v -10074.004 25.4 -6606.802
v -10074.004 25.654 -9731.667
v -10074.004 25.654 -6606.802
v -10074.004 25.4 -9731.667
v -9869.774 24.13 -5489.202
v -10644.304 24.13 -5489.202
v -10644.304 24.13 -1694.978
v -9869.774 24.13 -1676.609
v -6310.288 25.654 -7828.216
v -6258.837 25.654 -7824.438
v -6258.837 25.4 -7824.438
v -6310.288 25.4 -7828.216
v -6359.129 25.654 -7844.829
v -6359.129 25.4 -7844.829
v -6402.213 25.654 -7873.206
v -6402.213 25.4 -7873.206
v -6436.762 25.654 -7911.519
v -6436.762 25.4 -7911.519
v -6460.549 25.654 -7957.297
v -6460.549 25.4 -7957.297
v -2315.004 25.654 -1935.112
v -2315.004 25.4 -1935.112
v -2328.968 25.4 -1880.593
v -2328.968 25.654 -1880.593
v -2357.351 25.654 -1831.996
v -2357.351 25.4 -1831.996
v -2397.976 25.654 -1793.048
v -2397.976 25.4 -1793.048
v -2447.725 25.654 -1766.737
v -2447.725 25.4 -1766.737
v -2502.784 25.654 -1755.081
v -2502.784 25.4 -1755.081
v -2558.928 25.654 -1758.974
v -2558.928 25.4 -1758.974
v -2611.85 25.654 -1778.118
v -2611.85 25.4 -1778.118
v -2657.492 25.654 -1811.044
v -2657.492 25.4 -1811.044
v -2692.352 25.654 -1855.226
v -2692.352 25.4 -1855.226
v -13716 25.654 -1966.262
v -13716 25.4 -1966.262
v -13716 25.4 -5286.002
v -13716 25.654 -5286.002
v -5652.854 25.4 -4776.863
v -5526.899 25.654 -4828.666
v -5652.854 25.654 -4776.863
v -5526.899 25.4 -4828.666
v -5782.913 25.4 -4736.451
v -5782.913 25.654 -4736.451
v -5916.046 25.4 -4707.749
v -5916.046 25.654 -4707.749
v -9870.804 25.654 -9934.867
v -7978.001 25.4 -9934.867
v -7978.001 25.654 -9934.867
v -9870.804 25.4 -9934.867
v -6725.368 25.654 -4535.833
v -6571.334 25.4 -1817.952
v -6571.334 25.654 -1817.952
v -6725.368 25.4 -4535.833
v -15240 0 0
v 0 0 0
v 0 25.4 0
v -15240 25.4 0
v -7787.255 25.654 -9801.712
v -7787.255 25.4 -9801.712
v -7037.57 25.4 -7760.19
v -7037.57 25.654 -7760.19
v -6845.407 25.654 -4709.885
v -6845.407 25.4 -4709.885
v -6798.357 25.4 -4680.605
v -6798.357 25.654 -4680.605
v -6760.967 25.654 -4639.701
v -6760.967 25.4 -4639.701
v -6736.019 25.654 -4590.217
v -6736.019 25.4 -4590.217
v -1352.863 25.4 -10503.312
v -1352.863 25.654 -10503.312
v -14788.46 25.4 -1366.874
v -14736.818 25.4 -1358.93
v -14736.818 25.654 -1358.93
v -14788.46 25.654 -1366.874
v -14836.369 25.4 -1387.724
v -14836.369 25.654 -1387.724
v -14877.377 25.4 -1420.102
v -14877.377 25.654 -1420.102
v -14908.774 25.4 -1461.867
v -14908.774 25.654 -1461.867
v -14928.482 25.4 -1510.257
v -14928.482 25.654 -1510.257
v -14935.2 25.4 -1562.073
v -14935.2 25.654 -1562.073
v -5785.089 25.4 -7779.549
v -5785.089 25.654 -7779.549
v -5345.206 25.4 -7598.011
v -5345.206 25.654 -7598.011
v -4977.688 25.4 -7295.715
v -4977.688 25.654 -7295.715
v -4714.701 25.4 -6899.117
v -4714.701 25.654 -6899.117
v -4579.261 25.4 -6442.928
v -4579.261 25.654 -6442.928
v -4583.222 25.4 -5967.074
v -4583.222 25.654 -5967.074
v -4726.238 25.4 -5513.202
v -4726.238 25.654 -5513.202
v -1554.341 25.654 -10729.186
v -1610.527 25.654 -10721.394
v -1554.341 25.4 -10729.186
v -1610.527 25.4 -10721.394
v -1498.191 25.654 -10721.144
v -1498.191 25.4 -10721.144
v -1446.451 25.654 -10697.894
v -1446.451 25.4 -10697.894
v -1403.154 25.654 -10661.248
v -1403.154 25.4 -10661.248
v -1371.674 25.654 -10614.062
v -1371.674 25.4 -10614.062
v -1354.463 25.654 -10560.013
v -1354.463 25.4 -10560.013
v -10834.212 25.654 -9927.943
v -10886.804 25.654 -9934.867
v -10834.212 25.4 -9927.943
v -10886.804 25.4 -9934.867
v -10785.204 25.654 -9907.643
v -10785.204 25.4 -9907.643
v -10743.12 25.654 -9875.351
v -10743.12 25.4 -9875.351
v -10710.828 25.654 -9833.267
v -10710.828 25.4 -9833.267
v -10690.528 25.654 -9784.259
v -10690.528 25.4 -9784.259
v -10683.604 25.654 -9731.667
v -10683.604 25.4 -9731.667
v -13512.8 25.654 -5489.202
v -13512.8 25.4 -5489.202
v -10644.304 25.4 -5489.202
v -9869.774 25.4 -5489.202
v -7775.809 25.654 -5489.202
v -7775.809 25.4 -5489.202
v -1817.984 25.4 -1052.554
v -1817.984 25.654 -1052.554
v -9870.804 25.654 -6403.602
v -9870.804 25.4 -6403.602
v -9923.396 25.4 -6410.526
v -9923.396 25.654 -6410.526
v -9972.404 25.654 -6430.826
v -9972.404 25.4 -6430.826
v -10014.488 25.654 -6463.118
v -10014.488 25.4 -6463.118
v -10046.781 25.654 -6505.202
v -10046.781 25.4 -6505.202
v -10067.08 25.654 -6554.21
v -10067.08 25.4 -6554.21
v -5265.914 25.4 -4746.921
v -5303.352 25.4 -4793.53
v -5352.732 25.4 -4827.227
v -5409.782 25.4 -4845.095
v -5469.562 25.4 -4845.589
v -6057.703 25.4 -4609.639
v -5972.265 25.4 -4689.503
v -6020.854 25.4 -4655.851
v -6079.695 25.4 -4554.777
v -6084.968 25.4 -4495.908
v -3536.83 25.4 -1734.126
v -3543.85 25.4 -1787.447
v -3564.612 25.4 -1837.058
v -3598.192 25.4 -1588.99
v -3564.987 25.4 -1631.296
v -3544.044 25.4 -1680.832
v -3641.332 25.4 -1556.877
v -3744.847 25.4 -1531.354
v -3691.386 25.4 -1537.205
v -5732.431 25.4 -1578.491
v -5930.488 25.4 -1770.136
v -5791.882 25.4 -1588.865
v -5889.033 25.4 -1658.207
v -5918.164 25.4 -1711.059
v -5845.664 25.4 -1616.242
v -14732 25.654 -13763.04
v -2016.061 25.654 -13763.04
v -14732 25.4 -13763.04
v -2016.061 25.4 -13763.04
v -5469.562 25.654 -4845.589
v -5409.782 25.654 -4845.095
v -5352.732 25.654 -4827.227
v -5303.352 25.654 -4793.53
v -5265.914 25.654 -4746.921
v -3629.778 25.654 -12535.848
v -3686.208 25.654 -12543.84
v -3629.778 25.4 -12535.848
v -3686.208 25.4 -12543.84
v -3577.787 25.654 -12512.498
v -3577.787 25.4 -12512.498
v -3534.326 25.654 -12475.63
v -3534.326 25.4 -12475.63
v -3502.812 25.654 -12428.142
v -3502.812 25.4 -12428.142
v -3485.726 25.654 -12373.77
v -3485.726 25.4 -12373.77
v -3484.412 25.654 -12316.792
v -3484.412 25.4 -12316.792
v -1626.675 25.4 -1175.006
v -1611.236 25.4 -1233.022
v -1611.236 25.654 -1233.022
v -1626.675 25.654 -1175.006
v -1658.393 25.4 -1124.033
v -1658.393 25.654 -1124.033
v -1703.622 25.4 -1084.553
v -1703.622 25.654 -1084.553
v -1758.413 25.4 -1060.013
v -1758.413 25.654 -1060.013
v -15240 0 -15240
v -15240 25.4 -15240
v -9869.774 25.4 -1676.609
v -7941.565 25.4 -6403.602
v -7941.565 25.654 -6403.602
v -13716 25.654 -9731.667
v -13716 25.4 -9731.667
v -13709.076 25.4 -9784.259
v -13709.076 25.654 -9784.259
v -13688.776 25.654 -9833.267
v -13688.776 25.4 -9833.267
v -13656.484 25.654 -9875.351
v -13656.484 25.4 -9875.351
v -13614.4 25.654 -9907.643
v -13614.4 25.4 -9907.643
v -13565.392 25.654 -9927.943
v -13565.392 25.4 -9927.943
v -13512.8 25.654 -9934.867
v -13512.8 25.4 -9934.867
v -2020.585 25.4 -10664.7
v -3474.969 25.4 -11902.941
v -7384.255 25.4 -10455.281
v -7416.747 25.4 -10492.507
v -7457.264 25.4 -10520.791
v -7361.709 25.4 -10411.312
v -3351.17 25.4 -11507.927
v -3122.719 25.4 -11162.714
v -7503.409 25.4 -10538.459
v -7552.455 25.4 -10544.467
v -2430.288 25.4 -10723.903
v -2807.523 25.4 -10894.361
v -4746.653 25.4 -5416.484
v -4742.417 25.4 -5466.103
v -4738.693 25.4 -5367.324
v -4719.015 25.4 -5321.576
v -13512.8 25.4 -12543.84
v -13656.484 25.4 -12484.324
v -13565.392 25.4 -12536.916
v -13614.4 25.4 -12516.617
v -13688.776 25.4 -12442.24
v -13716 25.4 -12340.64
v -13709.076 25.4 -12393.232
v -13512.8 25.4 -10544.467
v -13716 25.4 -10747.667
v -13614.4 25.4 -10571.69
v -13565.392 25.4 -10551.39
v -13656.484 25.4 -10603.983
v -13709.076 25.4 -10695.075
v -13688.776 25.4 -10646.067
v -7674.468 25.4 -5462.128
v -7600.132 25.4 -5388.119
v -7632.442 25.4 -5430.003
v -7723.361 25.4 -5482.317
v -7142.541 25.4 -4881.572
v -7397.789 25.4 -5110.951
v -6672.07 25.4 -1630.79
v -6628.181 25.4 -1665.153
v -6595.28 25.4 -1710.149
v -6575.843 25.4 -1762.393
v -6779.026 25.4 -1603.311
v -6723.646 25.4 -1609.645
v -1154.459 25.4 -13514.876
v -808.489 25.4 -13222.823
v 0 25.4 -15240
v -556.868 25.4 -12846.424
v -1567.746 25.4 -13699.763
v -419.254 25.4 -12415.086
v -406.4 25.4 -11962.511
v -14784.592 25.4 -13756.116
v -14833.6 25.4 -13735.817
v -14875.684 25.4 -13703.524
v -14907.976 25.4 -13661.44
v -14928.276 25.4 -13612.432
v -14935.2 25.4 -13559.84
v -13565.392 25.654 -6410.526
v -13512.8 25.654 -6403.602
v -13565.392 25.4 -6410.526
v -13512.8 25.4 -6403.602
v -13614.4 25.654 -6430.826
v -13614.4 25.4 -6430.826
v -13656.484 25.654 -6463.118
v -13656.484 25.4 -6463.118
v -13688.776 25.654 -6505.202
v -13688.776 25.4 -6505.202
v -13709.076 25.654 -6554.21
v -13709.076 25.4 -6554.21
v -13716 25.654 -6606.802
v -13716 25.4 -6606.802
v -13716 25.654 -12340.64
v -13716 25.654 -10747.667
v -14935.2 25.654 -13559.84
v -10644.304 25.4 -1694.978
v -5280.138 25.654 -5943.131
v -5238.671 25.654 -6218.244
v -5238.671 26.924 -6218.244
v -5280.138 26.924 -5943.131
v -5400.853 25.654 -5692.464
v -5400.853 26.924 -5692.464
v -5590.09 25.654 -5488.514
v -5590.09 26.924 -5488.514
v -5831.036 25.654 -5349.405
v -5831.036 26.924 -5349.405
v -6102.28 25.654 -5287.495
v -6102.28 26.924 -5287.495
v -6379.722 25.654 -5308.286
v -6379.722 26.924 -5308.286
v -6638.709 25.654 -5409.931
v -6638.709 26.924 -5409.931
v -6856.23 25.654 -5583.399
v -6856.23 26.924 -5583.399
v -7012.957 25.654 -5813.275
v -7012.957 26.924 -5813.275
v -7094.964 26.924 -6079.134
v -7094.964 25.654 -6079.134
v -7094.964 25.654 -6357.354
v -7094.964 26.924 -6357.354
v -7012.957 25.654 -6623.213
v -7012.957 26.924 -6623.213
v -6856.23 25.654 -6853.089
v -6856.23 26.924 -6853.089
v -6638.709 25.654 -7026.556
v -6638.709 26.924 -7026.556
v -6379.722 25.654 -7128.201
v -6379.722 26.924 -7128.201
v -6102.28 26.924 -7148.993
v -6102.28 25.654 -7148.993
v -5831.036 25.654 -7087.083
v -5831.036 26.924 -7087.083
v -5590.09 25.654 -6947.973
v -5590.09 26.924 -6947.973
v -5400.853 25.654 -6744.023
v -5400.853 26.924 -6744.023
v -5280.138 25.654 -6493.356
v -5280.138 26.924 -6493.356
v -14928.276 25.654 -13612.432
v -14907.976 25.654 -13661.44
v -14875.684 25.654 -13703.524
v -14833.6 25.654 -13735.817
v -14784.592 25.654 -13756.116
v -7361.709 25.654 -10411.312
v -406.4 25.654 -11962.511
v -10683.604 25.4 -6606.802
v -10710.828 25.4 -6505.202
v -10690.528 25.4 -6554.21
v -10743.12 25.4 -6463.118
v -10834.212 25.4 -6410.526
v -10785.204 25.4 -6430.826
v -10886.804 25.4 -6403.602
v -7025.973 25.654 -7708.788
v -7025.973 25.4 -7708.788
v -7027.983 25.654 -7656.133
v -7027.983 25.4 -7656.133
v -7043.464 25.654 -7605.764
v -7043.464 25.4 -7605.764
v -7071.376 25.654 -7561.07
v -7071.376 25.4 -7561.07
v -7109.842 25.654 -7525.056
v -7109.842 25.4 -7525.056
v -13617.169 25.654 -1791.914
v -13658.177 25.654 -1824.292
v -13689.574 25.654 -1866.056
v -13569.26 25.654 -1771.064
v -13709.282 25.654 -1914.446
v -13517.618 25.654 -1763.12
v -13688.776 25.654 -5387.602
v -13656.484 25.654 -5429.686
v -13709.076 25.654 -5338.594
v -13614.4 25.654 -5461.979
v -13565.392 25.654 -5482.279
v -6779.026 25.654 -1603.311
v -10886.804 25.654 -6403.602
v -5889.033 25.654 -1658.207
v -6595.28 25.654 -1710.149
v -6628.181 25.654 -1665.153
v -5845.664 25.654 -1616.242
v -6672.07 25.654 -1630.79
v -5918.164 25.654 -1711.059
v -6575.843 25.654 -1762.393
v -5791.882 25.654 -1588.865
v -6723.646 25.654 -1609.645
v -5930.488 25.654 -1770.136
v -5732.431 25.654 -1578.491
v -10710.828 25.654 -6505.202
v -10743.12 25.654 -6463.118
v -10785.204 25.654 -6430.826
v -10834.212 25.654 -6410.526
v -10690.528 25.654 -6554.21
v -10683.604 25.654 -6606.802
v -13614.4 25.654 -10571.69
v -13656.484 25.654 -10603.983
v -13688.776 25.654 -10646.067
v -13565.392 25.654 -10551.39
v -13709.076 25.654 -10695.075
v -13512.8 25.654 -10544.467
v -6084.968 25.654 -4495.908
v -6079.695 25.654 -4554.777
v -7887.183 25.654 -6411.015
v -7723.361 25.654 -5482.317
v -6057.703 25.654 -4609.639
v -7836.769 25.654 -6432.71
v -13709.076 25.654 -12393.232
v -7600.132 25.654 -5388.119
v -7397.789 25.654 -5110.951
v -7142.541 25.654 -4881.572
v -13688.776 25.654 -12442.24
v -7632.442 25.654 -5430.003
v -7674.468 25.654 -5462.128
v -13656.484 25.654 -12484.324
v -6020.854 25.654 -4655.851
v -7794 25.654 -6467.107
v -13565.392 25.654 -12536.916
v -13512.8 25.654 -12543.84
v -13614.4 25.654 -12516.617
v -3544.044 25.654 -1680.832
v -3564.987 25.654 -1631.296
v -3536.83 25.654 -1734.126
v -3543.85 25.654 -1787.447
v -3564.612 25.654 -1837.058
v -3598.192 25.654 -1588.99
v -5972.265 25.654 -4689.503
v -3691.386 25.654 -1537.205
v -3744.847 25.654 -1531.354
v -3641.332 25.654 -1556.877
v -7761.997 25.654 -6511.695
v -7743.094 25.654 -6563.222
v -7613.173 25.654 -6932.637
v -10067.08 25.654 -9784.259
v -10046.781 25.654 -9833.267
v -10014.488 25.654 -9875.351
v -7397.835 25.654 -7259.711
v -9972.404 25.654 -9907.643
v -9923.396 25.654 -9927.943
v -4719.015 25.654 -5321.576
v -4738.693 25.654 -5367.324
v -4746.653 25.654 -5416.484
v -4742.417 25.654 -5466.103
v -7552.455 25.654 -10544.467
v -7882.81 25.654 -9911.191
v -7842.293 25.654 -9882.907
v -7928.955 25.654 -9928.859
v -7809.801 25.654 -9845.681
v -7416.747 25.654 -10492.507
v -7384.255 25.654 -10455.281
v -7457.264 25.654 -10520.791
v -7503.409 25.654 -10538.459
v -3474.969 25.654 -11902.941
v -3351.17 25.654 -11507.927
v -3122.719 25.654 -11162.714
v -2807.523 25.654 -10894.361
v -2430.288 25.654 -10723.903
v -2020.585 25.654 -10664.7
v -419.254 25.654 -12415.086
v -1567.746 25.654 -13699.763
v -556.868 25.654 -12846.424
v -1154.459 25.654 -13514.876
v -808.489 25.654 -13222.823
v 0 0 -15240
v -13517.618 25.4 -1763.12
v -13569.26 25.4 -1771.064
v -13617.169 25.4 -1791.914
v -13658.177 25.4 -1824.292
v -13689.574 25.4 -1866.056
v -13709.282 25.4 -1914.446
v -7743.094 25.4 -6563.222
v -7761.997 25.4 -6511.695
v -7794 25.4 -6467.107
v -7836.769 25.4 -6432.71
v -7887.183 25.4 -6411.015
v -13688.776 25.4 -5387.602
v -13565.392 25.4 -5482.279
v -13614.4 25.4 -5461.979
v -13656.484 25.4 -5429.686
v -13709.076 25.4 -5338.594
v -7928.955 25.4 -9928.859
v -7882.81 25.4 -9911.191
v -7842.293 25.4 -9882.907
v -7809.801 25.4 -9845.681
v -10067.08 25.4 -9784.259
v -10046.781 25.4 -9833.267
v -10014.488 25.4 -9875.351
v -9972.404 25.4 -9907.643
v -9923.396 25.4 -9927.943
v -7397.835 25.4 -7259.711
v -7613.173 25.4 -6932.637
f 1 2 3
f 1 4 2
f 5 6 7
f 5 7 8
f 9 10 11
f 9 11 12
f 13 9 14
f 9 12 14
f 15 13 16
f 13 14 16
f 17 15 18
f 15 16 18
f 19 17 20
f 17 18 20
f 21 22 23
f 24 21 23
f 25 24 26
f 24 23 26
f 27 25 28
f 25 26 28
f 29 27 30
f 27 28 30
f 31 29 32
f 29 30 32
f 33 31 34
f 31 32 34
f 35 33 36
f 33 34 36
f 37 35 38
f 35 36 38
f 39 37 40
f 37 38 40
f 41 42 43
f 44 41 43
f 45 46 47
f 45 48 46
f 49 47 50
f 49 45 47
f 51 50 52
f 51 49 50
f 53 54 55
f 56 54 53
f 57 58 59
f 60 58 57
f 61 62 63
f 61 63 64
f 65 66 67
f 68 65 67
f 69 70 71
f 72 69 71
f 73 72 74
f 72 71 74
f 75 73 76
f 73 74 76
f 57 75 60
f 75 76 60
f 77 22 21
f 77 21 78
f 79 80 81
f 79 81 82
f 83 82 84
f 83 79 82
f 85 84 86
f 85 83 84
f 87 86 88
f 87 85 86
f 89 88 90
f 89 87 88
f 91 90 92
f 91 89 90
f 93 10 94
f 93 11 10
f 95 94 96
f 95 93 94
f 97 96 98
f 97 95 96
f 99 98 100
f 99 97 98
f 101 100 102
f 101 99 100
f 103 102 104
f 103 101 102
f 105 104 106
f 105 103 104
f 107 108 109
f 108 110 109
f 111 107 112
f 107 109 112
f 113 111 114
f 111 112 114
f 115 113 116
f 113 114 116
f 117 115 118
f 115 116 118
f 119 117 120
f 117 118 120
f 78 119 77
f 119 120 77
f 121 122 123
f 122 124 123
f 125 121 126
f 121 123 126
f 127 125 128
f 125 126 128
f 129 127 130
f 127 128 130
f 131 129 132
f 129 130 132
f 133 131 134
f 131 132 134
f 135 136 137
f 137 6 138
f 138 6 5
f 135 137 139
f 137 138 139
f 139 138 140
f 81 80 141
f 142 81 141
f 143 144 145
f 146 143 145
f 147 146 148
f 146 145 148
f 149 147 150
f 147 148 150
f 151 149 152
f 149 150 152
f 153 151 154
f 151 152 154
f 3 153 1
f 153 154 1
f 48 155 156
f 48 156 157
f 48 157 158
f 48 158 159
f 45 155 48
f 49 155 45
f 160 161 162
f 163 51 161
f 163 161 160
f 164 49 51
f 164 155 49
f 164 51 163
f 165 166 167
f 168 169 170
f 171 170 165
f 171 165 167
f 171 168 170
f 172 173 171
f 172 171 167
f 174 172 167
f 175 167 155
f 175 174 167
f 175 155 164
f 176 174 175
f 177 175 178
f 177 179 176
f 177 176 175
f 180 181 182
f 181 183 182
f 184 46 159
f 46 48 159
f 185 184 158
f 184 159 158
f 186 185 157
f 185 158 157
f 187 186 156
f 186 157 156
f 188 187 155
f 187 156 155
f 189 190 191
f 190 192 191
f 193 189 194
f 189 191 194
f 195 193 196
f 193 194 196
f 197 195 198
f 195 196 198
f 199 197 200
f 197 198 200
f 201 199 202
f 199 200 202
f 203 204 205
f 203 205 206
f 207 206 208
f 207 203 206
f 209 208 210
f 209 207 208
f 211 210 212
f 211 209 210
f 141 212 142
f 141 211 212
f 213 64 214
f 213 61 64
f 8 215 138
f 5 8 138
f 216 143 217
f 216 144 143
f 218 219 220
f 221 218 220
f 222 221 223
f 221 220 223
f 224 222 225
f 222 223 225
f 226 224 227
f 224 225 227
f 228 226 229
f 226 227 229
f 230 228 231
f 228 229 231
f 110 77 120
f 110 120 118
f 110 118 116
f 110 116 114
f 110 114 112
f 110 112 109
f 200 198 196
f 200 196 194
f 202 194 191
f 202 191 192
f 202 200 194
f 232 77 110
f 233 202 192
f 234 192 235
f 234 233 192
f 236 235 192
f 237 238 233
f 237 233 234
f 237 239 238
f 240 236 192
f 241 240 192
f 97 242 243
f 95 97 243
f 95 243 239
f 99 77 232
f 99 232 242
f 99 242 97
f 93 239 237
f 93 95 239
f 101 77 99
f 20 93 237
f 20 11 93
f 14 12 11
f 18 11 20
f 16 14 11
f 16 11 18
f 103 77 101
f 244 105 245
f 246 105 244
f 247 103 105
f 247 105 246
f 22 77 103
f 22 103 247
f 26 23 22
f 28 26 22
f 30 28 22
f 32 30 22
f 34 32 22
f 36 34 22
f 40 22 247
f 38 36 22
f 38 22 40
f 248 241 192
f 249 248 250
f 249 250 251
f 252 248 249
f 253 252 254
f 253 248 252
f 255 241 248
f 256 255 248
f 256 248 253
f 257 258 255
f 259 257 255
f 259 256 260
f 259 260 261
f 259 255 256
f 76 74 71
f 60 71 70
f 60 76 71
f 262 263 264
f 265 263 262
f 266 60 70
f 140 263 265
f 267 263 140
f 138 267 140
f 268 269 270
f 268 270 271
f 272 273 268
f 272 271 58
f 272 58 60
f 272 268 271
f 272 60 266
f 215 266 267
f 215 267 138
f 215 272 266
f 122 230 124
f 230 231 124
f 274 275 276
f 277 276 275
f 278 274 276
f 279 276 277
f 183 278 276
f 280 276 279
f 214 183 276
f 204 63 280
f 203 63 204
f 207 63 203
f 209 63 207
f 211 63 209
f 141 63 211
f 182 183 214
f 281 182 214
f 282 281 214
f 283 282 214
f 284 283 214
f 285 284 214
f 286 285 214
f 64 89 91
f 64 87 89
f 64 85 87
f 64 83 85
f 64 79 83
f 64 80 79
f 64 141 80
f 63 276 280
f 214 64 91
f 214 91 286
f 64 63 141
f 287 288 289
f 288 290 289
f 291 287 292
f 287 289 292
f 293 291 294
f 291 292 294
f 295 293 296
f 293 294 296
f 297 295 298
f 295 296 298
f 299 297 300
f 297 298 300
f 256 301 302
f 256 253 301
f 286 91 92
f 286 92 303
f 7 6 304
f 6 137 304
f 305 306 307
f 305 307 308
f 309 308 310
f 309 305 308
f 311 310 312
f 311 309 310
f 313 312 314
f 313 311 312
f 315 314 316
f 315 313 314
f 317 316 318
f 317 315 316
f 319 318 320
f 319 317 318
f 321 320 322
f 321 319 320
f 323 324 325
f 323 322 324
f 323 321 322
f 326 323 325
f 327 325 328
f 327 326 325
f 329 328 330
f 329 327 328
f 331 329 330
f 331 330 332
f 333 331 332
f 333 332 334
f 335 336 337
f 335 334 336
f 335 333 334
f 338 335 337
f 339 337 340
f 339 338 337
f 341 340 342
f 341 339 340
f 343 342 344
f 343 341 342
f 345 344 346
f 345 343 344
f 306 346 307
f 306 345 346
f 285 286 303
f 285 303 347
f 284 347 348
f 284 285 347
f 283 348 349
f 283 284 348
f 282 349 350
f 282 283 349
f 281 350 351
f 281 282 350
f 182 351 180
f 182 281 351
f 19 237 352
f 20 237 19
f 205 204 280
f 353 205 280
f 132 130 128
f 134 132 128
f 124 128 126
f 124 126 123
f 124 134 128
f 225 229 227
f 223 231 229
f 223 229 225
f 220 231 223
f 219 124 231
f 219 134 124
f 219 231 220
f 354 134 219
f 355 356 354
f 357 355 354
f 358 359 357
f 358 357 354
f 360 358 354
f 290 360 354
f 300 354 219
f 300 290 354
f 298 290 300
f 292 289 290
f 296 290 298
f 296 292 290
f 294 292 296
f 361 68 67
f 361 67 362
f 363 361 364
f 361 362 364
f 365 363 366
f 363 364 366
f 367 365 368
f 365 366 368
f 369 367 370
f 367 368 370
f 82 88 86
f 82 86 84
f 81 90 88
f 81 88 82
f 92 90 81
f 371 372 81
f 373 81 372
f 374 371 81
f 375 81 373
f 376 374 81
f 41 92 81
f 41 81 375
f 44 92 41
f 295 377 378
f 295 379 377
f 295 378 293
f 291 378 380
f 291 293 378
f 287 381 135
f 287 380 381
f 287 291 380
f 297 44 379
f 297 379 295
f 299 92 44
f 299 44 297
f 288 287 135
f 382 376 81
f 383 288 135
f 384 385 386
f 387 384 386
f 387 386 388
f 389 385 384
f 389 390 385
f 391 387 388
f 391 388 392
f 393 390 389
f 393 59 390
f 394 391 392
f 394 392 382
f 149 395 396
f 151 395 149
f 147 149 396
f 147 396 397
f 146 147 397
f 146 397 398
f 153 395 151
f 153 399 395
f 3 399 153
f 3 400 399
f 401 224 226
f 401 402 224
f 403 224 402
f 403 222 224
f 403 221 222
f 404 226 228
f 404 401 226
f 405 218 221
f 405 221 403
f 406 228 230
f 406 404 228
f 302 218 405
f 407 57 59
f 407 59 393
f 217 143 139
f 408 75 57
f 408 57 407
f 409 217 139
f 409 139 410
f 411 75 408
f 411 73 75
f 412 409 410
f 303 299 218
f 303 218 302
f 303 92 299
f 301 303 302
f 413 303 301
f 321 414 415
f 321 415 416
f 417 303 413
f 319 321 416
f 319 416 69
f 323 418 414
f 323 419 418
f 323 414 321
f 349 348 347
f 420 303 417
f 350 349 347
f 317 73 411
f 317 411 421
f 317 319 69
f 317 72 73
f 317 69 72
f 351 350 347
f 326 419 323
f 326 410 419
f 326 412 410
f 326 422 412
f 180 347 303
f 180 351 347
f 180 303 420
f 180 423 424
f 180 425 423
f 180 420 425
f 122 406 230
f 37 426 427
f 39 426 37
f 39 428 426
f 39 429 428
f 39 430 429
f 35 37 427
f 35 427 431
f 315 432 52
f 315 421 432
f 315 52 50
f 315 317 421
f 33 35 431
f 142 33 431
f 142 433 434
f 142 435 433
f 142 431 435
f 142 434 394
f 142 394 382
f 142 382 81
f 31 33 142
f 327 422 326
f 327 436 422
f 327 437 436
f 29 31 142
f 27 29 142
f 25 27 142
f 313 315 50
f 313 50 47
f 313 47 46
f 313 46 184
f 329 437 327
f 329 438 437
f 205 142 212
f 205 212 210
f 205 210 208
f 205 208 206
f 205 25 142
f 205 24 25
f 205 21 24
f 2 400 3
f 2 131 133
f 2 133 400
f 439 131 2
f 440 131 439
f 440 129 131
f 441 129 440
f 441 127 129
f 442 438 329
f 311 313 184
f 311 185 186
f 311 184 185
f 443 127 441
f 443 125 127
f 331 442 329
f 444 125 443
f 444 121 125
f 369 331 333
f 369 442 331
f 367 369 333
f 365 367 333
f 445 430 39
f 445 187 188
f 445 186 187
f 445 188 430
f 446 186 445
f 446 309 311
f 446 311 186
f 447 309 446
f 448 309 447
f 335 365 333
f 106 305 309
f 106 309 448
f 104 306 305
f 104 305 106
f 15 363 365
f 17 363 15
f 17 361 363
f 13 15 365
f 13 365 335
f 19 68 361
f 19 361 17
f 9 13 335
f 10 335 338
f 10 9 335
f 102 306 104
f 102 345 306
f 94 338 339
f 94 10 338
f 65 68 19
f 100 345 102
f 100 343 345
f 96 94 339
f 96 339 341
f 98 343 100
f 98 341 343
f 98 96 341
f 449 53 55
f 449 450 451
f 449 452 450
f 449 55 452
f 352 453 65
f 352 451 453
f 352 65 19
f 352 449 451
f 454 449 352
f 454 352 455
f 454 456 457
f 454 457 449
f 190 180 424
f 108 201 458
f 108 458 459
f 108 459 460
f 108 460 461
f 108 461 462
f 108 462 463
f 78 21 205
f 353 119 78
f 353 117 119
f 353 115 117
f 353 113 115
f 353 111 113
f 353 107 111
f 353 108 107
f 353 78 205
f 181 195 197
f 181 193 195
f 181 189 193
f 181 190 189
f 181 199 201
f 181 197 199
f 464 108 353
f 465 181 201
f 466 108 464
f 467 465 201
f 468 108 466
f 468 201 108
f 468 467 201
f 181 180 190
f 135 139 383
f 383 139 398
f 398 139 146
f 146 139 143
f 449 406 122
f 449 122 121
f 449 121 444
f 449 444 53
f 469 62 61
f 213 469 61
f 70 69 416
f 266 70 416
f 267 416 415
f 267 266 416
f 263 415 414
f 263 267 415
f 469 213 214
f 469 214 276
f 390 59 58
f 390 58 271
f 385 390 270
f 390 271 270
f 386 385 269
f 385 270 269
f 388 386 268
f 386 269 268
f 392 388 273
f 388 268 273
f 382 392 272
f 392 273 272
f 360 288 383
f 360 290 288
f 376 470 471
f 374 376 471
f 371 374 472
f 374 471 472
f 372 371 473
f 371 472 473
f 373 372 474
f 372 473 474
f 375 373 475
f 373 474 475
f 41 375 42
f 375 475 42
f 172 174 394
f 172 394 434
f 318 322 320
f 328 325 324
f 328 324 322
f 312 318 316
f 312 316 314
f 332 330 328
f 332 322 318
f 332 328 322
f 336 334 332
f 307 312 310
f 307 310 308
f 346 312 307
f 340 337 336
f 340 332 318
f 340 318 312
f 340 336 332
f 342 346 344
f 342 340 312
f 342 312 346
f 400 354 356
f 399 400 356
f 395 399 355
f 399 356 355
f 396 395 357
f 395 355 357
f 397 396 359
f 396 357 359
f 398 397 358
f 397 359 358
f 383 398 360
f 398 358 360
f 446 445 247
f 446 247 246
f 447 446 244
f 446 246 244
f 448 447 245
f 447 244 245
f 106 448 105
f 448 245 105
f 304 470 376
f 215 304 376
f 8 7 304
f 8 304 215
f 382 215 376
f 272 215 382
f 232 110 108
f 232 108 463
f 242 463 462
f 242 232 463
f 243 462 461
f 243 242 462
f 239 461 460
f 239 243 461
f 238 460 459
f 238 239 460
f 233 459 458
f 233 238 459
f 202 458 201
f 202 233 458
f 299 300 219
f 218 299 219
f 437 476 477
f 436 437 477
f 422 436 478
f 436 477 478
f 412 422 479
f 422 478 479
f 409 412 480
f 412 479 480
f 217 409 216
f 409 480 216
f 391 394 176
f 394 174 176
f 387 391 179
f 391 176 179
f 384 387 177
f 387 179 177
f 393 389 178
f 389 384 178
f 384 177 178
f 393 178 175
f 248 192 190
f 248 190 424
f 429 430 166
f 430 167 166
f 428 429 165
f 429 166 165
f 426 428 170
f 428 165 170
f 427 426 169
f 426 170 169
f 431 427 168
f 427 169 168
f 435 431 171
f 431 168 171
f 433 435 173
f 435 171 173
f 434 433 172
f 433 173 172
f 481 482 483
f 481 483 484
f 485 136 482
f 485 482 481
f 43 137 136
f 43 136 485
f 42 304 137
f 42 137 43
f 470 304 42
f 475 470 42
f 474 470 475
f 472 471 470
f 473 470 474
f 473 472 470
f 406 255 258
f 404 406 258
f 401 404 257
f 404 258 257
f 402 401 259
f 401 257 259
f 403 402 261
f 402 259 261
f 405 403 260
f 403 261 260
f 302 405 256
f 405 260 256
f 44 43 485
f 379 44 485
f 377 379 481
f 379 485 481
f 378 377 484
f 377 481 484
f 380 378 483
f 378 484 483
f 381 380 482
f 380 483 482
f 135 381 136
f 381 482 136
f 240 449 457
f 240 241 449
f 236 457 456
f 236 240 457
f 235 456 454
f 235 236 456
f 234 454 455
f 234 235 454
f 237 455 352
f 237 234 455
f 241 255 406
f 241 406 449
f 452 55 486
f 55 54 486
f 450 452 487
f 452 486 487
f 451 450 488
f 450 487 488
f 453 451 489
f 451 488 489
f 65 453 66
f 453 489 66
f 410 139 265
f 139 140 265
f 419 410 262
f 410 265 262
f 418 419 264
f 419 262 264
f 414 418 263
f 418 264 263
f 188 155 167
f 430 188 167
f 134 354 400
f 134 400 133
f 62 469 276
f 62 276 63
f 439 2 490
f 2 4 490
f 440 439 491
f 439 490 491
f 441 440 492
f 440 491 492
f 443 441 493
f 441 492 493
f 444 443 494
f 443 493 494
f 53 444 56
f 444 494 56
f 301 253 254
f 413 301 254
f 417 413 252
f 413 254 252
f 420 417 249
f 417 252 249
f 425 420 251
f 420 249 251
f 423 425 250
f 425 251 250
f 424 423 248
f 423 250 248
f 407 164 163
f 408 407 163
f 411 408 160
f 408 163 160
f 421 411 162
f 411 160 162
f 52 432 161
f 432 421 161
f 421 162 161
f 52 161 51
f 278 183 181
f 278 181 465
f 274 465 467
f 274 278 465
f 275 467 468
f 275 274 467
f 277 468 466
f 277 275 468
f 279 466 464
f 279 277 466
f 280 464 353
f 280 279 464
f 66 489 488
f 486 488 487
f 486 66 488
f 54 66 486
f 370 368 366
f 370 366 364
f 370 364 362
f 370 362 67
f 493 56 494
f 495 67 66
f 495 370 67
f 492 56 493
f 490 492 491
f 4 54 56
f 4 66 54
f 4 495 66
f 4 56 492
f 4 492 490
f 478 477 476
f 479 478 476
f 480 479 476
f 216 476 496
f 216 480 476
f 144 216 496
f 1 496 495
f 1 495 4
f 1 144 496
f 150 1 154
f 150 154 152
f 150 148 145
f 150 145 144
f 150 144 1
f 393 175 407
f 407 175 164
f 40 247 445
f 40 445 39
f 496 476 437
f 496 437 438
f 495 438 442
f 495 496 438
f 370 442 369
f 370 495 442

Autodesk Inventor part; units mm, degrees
ref_plane "YZ Plane" through (0, 0, 0) normal (1, 0, 0) x (0, 1, 0)
ref_plane "XZ Plane" through (0, 0, 0) normal (0, 1, 0) x (-1, 0, 0)
ref_plane "XY Plane" through (0, 0, 0) normal (0, 0, 1) x (1, 0, 0)
sketch "Sketch1" plane through (0, 0, 0) normal (0, 1, 0) x (-1, 0, 0)
  line L0 (0, 0) -> (15240, 0)
  line L1 (15240, 0) -> (15240, -15240)
  line L2 (15240, -15240) -> (0, -15240)
  line L3 (0, -15240) -> (0, 0)
  dimension "d0" = 15240
  dimension "d1" = 15240
extrude "Extrusion1" add sketch "Sketch1" along normal blind 25.4
sketch "Sketch2" plane through (0, 25.4, 0) normal (0, 1, 0) x (1, 0, 0)
  line L0 (-14935.2, 1562.0729) -> (-14935.2, 13559.8402)
  line L1 (-14736.8176, 1358.93) -> (-1817.9841, 1052.5545)
  line L2 (-1611.2356, 1233.0221) -> (-406.4, 11962.5108)
  line L3 (-2016.0607, 13763.0402) -> (-14732, 13763.0402)
  line L4 (-2315.0035, 1935.1122) -> (-1352.8633, 10503.3117)
  line L5 (-3686.2075, 12543.8402) -> (-13512.8, 12543.8402)
  line L6 (-13716, 12340.6402) -> (-13716, 10747.6666)
  line L7 (-13512.8, 10544.4666) -> (-7552.4546, 10544.4666)
  line L8 (-7361.709, 10411.312) -> (-6460.5488, 7957.2969)
  line L9 (-13512.8, 6403.6024) -> (-10886.8043, 6403.6024)
  line L10 (-10683.6043, 6606.8024) -> (-10683.6043, 9731.6666)
  line L11 (-13512.8, 5489.2024) -> (-10683.6043, 5489.2024)
  line L12 (-10683.6043, 5489.2024) -> (-9414.0453, 5489.2024)
  line L13 (-9414.0453, 5489.2024) -> (-7775.8091, 5489.2024)
  line L14 (-7978.0008, 9934.8666) -> (-9870.8043, 9934.8666)
  line L15 (-10074.0043, 9731.6666) -> (-10074.0043, 6606.8024)
  line L16 (-9870.8043, 6403.6024) -> (-7941.5651, 6403.6024)
  line L17 (-13716, 6606.8024) -> (-13716, 9731.6666)
  line L18 (-13512.8, 9934.8666) -> (-10886.8043, 9934.8666)
  line L19 (-13716, 1966.2624) -> (-13716, 5286.0024)
  line L20 (-5265.9143, 4746.921) -> (-3564.6116, 1837.0583)
  line L21 (-4719.0152, 5321.5764) -> (-2692.3523, 1855.2262)
  line L22 (-7787.2552, 9801.712) -> (-7037.5702, 7760.1901)
  line L23 (-15240, 15240) -> (-15240, 0) projected
  line L24 (-6571.3344, 1817.9516) -> (-6725.3675, 4535.8332)
  line L25 (-5930.4882, 1770.1358) -> (-6084.9684, 4495.908)
  arc A0 (-7600.1322, 5388.1194) -> (-6845.407, 4709.885) centre (-6172.0298, 6218.2437) ccw
  arc A1 (-5916.0462, 4707.7491) -> (-5526.8987, 4828.6656) centre (-6172.0298, 6218.2437) ccw
  arc A2 (-4726.2381, 5513.2025) -> (-6258.8372, 7824.4383) centre (-6172.0298, 6218.2437) ccw
  arc A3 (-7109.8425, 7525.0559) -> (-7743.0935, 6563.2215) centre (-6172.0298, 6218.2437) ccw
  arc A4 (-3484.4118, 12316.7921) -> (-1610.5268, 10721.3945) centre (-2016.0607, 12143.2628) ccw
  arc A5 (-406.4, 11962.5108) -> (-2016.0607, 13763.0402) centre (-2016.0607, 12143.2628) ccw
  arc A6 (-13512.8, 5489.2024) -> (-13716, 5286.0024) centre (-13512.8, 5286.0024) ccw
  arc A7 (-13716, 6606.8024) -> (-13512.8, 6403.6024) centre (-13512.8, 6606.8024) ccw
  arc A8 (-10886.8043, 6403.6024) -> (-10683.6043, 6606.8024) centre (-10886.8043, 6606.8024) ccw
  arc A9 (-10074.0043, 6606.8024) -> (-9870.8043, 6403.6024) centre (-9870.8043, 6606.8024) ccw
  arc A10 (-10683.6043, 9731.6666) -> (-10886.8043, 9934.8666) centre (-10886.8043, 9731.6666) ccw
  arc A11 (-9870.8043, 9934.8666) -> (-10074.0043, 9731.6666) centre (-9870.8043, 9731.6666) ccw
  arc A12 (-7787.2552, 9801.712) -> (-7978.0008, 9934.8666) centre (-7978.0008, 9731.6666) ccw
  arc A13 (-7361.709, 10411.312) -> (-7552.4546, 10544.4666) centre (-7552.4546, 10341.2666) ccw
  arc A14 (-13512.8, 9934.8666) -> (-13716, 9731.6666) centre (-13512.8, 9731.6666) ccw
  arc A15 (-13716, 10747.6666) -> (-13512.8, 10544.4666) centre (-13512.8, 10747.6666) ccw
  arc A16 (-13716, 1966.2624) -> (-13517.6176, 1763.1195) centre (-13512.8, 1966.2624) ccw
  arc A17 (-7600.1322, 5388.1194) -> (-7775.8091, 5489.2024) centre (-7775.8091, 5286.0024) ccw
  arc A18 (-7941.5651, 6403.6024) -> (-7743.0935, 6563.2215) centre (-7941.5651, 6606.8024) ccw
  arc A19 (-7109.8425, 7525.0559) -> (-7037.5702, 7760.1901) centre (-7228.3158, 7690.1447) ccw
  arc A20 (-6460.5488, 7957.2969) -> (-6258.8372, 7824.4383) centre (-6269.8032, 8027.3422) ccw
  arc A21 (-3484.4118, 12316.7921) -> (-3686.2075, 12543.8402) centre (-3686.2075, 12340.6402) ccw
  arc A22 (-1352.8633, 10503.3117) -> (-1610.5268, 10721.3945) centre (-1554.7942, 10525.9869) ccw
  arc A23 (-13512.8, 12543.8402) -> (-13716, 12340.6402) centre (-13512.8, 12340.6402) ccw
  arc A24 (-14732, 13763.0402) -> (-14935.2, 13559.8402) centre (-14732, 13559.8402) ccw
  arc A25 (-14935.2, 1562.0729) -> (-14736.8176, 1358.93) centre (-14732, 1562.0729) ccw
  arc A26 (-1817.9841, 1052.5545) -> (-1611.2356, 1233.0221) centre (-1813.1665, 1255.6974) ccw
  line L26 (-13517.6176, 1763.1195) -> (-6779.0265, 1603.311)
  line L27 (-5732.4314, 1578.4906) -> (-3744.8471, 1531.3542)
  arc A27 (-6779.0265, 1603.311) -> (-6571.3344, 1817.9516) centre (-6774.2089, 1806.4539) ccw
  arc A28 (-5930.4882, 1770.1358) -> (-5732.4314, 1578.4906) centre (-5727.6138, 1781.6335) ccw
  arc A29 (-3744.8471, 1531.3542) -> (-3564.6116, 1837.0583) centre (-3740.0295, 1734.4971) ccw
  arc A30 (-2692.3523, 1855.2262) -> (-2315.0035, 1935.1122) centre (-2516.9343, 1957.7874) ccw
  arc A31 (-4726.2381, 5513.2025) -> (-4719.0152, 5321.5764) centre (-4543.5973, 5424.1376) ccw
  arc A32 (-5265.9143, 4746.921) -> (-5526.8987, 4828.6656) centre (-5441.3322, 4644.3598) ccw
  arc A33 (-5916.0462, 4707.7491) -> (-6084.9684, 4495.908) centre (-5882.094, 4507.4057) ccw
  arc A34 (-6725.3675, 4535.8332) -> (-6845.407, 4709.885) centre (-6928.2419, 4524.3355) ccw
  line L28 (0, 0) -> (0, 15240) projected
  point P0 (-3439.3334, 12543.8402)
  point P1 (-6406.322, 7809.628)
  point P2 (-7654.2854, 5489.2024)
  point P3 (-7769.8073, 6403.6024)
  point P4 (-5364.833, 4916.109)
  point P5 (-4776.041, 5419.1118)
  point P6 (-6981.7147, 7608.0859)
  point P7 (-6732.6566, 4664.4482)
  point P8 (-6095.8611, 4688.1065)
  point P9 (-1314.8846, 10841.5257)
  dimension "d4" = 304.8
  dimension "d5" = 1219.2
  dimension "d6" = 1219.2
  dimension "d7" = 1219.2
  dimension "d8" = 1219.2
  dimension "d9" = 609.6
  dimension "d10" = 914.4
  dimension "d11" = 609.6
  dimension "d12" = 914.4
  dimension "d14" = 609.6
  dimension "d16" = 203.2
  dimension "d17" = 609.6
  dimension "d18" = 203.2
  dimension "d19" = 203.2
  dimension "d20" = 406.4
extrude "Extrusion2" add sketch "Sketch2" along normal blind 0.254
sketch "Sketch3" plane through (0, 25.4, 0) normal (0, 1, 0) x (1, 0, 0)
  line L0 (-13512.8, 5489.2024) -> (-7775.8091, 5489.2024) projected
  line L1 (-10644.3045, 5489.2024) -> (-10644.3045, 1694.9777)
  line L2 (-6779.0265, 1603.311) -> (-13517.6176, 1763.1195) projected
  line L3 (-9869.7738, 1676.6094) -> (-9869.7738, 5489.2024)
  line L4 (-10644.3045, 5489.2024) -> (-9869.7738, 5489.2024)
  line L5 (-9869.7738, 1676.6094) -> (-10644.3045, 1694.9777)
  point P0 (0, 0)
extrude "Extrusion3" cut sketch "Sketch3" against normal blind 1.27
sketch "Sketch4" plane through (0, 25.654, 0) normal (0, 1, 0) x (1, 0, 0)
  arc A0 (-4726.2381, 5513.2025) -> (-6258.8372, 7824.4383) centre (-6172.0298, 6218.2437) ccw projected
  circle A1 centre (-6172.0298, 6218.2437) radius 933.3587
  point P0 (0, 0)
extrude "Extrusion4" add sketch "Sketch4" along normal blind 1.27
equation "\"d6\" = d5"
equation "\"d7\" = d6"
equation "\"d8\" = d7"
equation "\"d12\" = d10"
equation "\"d14\" = d9"
equation "\"d17\" = d14"
properties part number "Mcity track"
